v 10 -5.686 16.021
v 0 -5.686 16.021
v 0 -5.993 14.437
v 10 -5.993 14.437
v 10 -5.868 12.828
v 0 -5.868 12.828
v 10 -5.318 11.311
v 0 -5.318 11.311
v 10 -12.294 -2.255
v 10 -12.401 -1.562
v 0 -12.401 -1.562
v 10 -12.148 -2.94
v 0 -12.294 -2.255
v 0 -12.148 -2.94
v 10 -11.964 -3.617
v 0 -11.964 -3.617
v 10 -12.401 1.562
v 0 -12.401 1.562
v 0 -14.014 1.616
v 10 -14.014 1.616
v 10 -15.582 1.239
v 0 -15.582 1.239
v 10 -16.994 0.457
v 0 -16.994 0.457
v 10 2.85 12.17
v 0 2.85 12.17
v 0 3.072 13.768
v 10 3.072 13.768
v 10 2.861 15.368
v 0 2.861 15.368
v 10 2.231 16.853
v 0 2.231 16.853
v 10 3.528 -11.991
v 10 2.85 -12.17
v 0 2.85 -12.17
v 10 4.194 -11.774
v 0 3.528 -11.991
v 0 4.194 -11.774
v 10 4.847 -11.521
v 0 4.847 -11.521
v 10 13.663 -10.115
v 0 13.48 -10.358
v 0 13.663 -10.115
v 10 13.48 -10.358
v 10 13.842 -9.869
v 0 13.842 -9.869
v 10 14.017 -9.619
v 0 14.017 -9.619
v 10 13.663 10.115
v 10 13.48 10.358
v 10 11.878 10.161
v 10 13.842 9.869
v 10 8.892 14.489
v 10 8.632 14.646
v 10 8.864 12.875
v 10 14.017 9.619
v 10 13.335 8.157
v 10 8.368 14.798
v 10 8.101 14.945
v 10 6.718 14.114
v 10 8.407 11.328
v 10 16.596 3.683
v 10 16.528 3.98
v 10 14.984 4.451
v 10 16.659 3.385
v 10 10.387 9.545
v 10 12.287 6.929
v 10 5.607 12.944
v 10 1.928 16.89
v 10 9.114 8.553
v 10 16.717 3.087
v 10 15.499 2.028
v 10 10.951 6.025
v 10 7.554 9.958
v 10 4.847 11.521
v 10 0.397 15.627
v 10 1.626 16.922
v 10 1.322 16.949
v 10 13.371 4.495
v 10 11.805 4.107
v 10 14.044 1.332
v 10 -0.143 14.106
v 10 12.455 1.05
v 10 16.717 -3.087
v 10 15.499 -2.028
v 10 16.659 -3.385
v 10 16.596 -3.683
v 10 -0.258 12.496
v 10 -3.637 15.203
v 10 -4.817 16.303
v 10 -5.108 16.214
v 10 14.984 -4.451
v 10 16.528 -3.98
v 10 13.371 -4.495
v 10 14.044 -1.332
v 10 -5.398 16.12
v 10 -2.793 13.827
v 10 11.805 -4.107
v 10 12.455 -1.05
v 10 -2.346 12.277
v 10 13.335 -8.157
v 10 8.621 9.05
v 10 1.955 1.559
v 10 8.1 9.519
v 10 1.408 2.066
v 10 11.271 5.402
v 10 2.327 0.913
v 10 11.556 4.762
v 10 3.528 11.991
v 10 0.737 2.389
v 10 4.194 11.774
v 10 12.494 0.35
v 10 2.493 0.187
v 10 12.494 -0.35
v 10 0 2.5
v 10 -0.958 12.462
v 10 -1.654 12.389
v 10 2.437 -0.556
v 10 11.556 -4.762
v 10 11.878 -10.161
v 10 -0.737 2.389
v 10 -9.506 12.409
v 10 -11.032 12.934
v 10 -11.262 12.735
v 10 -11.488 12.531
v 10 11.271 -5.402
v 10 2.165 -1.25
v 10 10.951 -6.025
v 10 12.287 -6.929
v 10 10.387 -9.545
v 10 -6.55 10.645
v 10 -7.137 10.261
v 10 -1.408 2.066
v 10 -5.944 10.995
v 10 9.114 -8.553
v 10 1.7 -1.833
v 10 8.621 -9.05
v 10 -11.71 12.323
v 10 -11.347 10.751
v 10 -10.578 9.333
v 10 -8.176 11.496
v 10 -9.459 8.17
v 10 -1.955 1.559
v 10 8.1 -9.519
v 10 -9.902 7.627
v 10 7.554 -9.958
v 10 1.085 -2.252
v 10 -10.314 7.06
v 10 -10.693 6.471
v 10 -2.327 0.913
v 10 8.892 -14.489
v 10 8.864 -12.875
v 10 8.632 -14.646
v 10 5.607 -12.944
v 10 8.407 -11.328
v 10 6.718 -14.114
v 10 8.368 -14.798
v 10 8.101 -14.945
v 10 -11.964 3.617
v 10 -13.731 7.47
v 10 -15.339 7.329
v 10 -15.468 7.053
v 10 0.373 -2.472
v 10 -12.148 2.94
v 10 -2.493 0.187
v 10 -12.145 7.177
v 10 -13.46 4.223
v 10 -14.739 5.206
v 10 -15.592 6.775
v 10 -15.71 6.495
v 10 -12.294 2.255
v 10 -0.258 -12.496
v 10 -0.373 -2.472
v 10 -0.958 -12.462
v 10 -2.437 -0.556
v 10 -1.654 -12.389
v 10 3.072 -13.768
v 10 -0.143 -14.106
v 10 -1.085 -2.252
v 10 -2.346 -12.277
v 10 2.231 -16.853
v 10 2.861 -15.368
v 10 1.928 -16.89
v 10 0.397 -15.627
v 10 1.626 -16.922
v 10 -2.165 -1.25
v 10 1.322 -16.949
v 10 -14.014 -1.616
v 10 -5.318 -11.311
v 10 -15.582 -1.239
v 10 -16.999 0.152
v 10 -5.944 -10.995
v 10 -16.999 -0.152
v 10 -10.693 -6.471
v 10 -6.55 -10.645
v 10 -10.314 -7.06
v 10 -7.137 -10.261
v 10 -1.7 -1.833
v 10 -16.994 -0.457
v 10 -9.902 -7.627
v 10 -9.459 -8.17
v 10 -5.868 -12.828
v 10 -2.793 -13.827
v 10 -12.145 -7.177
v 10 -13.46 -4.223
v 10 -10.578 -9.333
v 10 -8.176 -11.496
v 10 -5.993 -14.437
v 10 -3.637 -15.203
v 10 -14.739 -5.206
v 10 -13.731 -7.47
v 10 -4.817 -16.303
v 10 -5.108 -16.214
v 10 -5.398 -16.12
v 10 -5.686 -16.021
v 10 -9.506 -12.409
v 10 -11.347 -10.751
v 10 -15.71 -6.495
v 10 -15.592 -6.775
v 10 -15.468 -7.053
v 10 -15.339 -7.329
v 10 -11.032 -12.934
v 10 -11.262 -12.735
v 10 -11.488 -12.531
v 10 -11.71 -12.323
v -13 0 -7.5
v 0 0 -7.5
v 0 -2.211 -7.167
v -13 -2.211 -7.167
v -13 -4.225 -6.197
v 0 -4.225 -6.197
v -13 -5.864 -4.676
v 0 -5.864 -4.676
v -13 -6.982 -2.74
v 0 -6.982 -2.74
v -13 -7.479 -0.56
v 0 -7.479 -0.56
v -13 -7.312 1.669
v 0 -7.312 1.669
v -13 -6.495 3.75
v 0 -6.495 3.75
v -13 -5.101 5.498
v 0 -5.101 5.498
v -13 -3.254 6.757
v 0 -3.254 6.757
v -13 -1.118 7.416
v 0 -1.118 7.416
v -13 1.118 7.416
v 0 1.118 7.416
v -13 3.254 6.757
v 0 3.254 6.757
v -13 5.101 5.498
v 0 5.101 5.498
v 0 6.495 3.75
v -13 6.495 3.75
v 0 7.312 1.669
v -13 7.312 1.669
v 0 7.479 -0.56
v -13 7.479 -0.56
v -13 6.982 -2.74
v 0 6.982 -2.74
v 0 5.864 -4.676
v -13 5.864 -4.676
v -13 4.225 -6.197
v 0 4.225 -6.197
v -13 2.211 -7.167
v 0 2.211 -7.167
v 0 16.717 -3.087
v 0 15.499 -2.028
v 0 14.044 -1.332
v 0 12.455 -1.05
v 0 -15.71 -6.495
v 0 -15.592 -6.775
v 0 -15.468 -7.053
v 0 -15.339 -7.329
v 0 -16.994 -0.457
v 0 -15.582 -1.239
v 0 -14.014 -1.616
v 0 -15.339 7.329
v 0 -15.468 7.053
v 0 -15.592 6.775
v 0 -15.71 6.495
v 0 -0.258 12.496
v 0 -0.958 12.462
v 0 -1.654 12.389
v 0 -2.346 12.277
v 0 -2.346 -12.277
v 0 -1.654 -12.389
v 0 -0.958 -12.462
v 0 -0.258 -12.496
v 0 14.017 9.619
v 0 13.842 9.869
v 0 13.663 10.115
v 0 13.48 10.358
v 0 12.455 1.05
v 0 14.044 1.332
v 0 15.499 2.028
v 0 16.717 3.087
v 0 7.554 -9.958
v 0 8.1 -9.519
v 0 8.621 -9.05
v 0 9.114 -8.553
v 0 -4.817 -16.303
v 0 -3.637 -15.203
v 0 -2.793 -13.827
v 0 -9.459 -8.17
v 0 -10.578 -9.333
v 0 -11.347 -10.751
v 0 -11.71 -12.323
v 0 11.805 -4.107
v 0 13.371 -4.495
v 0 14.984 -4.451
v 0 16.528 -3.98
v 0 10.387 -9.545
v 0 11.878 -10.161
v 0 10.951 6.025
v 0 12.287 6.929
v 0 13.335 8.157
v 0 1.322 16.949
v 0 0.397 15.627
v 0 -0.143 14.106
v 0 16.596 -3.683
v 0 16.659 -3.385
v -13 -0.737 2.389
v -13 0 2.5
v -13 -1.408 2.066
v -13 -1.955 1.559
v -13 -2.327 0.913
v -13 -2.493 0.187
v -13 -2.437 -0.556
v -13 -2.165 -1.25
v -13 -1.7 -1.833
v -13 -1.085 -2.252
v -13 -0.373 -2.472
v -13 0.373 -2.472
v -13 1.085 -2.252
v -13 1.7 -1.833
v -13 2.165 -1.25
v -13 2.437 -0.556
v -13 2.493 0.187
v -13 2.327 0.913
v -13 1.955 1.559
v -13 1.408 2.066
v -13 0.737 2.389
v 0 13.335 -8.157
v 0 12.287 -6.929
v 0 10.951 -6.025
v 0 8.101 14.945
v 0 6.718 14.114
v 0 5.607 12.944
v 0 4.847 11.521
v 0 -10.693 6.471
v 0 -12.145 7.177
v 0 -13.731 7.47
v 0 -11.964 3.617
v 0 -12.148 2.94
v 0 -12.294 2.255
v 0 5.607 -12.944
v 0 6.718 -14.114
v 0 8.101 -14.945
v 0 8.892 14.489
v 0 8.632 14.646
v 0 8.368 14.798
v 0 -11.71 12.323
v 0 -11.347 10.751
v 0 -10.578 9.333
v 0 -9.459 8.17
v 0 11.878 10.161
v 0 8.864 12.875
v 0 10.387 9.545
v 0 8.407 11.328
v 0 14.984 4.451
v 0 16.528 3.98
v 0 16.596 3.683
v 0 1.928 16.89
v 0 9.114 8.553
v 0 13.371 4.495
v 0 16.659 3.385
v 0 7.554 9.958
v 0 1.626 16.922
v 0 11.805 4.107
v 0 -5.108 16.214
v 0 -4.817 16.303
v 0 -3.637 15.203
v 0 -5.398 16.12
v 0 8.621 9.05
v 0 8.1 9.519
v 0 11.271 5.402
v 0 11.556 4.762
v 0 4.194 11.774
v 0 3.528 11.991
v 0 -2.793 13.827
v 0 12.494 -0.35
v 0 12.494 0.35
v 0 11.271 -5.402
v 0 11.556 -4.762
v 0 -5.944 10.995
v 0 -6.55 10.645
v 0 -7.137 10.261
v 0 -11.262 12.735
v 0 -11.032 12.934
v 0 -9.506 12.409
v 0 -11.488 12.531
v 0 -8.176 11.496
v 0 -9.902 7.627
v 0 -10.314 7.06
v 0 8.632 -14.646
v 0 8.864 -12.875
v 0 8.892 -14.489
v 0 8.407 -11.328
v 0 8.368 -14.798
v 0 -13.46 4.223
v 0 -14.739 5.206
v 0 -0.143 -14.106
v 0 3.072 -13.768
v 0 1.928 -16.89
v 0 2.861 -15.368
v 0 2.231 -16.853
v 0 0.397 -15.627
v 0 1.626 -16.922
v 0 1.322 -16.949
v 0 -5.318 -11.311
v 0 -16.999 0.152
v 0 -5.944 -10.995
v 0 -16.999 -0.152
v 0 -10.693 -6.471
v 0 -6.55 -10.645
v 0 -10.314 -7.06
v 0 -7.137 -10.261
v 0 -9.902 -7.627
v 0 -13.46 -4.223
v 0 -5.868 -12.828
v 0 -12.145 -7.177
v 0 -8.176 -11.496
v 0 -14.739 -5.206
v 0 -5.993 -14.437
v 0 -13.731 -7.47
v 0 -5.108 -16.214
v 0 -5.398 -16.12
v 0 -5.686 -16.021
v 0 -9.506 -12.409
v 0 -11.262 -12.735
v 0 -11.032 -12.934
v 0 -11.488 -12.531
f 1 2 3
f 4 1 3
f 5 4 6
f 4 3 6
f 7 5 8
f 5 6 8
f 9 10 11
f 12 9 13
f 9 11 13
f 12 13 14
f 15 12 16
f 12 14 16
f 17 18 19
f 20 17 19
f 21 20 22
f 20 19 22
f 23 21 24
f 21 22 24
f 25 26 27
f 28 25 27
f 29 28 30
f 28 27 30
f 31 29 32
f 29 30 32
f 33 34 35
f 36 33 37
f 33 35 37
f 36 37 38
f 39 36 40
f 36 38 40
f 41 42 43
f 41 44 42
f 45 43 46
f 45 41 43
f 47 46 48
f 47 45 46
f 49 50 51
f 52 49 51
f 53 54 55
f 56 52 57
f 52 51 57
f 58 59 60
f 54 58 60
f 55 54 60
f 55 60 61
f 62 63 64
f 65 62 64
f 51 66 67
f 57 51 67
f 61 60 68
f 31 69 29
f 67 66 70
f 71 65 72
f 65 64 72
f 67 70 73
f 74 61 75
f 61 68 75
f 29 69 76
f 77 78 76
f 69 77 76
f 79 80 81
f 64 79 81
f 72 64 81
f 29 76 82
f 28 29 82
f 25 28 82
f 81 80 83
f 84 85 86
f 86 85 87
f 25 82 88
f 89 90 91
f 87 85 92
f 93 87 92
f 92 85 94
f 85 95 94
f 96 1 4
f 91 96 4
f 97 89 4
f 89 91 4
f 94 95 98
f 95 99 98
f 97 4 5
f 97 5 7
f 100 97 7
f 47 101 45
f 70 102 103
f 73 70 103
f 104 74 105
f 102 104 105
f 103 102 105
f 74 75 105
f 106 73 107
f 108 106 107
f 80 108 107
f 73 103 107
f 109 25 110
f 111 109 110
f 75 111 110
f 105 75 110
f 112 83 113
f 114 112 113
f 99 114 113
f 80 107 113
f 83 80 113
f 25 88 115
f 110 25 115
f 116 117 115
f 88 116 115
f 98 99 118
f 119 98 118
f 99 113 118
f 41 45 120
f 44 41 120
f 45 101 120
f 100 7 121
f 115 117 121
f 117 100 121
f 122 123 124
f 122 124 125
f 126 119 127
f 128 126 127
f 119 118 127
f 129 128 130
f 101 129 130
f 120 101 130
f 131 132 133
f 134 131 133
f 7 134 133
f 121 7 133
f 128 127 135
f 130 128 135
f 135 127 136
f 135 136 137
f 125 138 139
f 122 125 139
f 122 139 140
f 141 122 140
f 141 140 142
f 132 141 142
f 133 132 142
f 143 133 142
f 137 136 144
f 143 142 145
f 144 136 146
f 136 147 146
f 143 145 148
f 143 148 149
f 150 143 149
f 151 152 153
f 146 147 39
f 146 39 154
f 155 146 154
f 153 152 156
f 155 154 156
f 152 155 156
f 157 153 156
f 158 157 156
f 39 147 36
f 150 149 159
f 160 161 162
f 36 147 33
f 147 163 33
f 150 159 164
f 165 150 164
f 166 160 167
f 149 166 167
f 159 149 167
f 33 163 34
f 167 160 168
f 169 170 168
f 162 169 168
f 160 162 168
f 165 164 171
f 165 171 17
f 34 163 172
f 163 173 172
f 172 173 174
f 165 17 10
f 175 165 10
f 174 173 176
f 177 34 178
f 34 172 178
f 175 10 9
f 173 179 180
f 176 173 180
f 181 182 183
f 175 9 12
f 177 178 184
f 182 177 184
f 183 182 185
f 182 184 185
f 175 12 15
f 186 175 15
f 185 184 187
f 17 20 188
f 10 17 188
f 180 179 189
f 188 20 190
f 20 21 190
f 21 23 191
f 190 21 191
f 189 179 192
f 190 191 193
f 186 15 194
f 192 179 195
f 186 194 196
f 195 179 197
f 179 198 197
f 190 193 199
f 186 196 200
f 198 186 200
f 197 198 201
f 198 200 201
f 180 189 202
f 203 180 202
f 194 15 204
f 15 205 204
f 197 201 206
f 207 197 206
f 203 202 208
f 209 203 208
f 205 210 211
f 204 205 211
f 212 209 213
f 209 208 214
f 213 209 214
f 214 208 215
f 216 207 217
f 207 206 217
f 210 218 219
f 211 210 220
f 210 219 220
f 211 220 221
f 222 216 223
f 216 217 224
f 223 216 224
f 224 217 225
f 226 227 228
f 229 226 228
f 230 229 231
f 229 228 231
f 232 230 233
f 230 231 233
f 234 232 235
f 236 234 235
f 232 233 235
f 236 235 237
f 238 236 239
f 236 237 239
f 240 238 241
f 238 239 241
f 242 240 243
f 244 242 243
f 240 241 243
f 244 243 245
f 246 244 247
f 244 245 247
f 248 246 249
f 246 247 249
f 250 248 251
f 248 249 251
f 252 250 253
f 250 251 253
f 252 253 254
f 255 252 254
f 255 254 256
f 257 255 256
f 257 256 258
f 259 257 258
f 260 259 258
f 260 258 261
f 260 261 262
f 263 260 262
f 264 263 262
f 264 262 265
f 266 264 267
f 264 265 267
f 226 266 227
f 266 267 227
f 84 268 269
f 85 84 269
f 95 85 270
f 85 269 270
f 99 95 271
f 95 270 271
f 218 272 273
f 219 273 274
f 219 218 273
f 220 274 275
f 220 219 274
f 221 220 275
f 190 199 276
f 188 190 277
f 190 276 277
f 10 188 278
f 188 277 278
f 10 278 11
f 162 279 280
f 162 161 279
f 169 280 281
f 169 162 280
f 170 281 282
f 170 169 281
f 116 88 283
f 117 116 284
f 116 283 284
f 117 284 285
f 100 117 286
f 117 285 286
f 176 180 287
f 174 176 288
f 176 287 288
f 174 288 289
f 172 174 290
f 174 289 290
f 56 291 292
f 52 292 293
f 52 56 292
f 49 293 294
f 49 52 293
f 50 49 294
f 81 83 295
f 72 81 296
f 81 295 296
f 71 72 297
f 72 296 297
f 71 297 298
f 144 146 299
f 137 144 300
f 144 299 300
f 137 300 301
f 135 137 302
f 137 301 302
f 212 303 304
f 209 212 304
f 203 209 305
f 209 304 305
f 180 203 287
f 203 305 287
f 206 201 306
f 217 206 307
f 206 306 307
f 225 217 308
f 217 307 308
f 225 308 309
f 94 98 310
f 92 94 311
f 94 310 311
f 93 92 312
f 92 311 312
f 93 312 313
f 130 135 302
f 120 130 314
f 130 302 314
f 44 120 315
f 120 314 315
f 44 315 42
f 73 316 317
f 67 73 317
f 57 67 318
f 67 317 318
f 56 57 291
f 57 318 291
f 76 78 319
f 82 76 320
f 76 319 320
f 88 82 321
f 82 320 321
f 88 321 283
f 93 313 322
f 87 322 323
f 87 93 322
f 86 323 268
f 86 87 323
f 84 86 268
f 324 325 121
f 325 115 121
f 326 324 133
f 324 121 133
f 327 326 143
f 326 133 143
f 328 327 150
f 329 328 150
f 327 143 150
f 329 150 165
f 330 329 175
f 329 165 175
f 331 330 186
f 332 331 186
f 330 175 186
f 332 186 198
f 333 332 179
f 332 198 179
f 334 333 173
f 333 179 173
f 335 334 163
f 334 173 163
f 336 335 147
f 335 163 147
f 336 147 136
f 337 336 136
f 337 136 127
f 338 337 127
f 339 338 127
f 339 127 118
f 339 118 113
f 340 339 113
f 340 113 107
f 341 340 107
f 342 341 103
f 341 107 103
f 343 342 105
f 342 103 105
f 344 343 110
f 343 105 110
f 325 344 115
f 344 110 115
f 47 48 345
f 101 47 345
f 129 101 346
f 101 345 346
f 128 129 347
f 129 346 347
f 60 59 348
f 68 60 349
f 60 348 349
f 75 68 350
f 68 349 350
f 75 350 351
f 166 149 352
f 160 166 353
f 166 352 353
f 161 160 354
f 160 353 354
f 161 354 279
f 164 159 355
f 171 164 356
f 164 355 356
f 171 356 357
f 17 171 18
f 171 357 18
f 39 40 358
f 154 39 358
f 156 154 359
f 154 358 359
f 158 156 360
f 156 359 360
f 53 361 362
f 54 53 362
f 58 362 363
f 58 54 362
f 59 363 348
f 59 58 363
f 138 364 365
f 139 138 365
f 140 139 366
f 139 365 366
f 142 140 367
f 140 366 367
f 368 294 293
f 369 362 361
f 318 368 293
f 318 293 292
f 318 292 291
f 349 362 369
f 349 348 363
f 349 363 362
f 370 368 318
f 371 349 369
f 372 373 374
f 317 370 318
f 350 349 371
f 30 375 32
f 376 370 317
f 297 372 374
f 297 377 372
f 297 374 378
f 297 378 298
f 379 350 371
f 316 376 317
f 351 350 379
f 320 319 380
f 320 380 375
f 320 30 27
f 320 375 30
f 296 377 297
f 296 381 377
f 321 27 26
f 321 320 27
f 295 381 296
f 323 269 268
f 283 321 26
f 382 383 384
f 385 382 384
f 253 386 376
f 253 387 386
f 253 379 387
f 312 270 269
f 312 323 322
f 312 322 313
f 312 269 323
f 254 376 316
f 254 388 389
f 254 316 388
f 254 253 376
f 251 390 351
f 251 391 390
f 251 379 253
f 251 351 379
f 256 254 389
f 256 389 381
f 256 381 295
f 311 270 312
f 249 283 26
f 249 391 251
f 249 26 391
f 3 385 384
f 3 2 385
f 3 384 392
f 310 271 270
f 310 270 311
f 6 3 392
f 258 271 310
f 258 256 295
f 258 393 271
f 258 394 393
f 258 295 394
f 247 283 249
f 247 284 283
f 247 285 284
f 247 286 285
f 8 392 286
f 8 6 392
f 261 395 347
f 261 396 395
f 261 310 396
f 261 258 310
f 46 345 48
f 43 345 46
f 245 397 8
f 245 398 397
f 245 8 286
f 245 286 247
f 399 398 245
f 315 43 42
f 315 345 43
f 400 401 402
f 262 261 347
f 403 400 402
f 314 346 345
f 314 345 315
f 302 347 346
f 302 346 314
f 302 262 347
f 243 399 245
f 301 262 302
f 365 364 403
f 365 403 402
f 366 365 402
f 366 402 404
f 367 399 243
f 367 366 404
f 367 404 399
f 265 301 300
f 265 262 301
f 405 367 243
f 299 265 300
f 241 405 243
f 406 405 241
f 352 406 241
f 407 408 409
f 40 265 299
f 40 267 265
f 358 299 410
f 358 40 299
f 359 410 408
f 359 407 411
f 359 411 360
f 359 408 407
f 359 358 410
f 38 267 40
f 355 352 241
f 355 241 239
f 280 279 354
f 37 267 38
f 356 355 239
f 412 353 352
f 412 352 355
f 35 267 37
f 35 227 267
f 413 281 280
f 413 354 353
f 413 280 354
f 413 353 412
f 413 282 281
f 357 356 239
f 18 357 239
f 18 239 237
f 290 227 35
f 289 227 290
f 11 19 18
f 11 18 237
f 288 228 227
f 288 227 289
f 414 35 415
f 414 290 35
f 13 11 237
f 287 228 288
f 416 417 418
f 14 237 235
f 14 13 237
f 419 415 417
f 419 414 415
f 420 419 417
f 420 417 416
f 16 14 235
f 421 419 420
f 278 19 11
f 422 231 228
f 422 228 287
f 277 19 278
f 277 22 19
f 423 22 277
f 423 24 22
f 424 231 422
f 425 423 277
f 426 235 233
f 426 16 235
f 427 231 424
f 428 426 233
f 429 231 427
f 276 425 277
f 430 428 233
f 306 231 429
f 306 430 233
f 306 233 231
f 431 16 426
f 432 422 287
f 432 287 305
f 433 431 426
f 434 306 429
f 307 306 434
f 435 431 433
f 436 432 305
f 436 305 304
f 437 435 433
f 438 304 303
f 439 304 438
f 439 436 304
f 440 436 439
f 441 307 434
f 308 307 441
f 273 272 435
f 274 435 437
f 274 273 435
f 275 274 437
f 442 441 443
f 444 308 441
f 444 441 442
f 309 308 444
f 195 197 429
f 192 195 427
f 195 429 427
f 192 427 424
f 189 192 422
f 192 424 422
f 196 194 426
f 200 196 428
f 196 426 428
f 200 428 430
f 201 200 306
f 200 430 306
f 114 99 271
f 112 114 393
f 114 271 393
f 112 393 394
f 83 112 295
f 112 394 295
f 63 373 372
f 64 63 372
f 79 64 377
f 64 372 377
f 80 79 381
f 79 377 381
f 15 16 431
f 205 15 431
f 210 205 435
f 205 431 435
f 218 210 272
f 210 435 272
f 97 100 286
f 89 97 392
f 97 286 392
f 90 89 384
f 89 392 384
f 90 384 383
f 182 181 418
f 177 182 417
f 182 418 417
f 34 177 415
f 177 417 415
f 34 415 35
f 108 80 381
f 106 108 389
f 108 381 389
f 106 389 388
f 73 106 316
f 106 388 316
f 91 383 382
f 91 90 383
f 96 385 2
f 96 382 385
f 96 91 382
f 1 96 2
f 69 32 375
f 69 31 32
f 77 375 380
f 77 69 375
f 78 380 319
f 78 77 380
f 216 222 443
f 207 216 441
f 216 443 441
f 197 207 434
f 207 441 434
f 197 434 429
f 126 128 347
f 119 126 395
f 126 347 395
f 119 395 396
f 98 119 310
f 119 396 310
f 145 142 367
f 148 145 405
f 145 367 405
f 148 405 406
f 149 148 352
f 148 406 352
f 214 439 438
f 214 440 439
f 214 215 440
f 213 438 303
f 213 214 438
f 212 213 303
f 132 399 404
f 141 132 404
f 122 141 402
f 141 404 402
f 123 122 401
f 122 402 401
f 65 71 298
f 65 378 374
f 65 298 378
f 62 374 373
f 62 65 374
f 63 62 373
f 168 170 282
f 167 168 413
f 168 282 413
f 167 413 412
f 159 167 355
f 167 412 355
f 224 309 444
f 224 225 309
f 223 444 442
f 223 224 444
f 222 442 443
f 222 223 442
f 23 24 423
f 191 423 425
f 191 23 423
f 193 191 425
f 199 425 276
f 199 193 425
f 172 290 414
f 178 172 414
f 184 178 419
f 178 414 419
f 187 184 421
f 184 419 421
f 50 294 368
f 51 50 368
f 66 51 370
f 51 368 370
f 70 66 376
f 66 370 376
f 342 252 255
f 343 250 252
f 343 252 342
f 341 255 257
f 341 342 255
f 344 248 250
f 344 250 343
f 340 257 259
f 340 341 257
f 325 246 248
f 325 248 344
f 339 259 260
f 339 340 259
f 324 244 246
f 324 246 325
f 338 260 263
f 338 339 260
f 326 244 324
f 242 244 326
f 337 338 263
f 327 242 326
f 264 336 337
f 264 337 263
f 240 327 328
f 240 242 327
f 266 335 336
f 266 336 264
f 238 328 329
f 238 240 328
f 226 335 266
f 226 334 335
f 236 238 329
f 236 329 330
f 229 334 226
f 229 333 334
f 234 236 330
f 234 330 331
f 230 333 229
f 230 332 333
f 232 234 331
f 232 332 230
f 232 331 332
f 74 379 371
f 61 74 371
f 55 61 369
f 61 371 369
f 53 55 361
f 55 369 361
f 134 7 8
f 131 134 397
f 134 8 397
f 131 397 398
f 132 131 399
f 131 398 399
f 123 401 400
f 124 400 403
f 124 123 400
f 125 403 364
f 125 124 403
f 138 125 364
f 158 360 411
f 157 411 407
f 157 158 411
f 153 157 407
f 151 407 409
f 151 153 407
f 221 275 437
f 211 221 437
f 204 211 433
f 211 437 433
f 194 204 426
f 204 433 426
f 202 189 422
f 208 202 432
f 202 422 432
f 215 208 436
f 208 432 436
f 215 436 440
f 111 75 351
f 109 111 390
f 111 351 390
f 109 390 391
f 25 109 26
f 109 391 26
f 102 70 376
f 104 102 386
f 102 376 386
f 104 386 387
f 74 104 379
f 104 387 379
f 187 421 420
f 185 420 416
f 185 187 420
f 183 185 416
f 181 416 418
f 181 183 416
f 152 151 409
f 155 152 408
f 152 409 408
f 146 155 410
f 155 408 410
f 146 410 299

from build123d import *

# Parameters (mm, degrees)
BASPROSKE_W      = 10
BASPROSKE_H      = 17
TOOTHCUT_DEPTH   = 27.038433133
TEETHCUTS_COUNT  = 15
TEETHCUTS_ANGLE  = 336
HUBNEAONESKE_R   = 7.5
HUBNEARONE_DEPTH = 13.0000508
BORSKE_R         = 2.5
BORE_DEPTH       = 23.0000508


with BuildPart() as part:
    # BasProSke → Base-Revolve (revolve)
    with BuildSketch(Plane(origin=(0, 0, 0), x_dir=(1, 0, 0), z_dir=(0, 1, 0)), mode=Mode.PRIVATE) as base_revolve_sk:
        with Locations((5, 8.5)):
            Rectangle(BASPROSKE_W, BASPROSKE_H)
    revolve(base_revolve_sk.sketch.rotate(Axis((-10, 0, 0), (1, 0, 0)), 180), axis=Axis((-10, 0, 0), (1, 0, 0)))

    # TooCutSke → ToothCut (cut, through all)
    with BuildSketch(Plane(origin=(0, 0, 0), x_dir=(0, 0, -1), z_dir=(1, 0, 0))):
        with BuildLine():
            ThreePointArc((1.050056448, 12.454813626), (0, 12.499), (-1.050056448, 12.454813626))
            ThreePointArc((-1.050056448, 12.454813626), (-1.638118106, 14.809604533), (-3.110934279, 16.73876737))
            ThreePointArc((-3.110934279, 16.73876737), (0, 17.0254), (3.110934279, 16.73876737))
            ThreePointArc((3.110934279, 16.73876737), (1.638118106, 14.809604533), (1.050056448, 12.454813626))
        make_face()
    toothcut = extrude(amount=TOOTHCUT_DEPTH, mode=Mode.SUBTRACT)

    # TeethCuts: ToothCut ×15 about axis
    teethcuts_axis = Axis((-10, 0, 0), (1, 0, 0))
    for i in range(1, TEETHCUTS_COUNT):
        add(toothcut.rotate(teethcuts_axis, i * TEETHCUTS_ANGLE / (TEETHCUTS_COUNT - 1)), mode=Mode.SUBTRACT)

    # HubNeaOneSke → HubNearOne (add)
    with BuildSketch(Plane.ZY):
        with Locations(Location((0, 0, 0), (0, 0, 180))):
            Circle(HUBNEAONESKE_R)
    extrude(amount=HUBNEARONE_DEPTH)

    # BorSke → Bore (cut, symmetric)
    with BuildSketch(Plane(origin=(0, 0, 0), x_dir=(0, 0, -1), z_dir=(1, 0, 0))):
        with Locations(Location((0, 0, 0), (0, 0, 180))):
            Circle(BORSKE_R)
    extrude(amount=BORE_DEPTH, both=True, mode=Mode.SUBTRACT)


solid = part.part
